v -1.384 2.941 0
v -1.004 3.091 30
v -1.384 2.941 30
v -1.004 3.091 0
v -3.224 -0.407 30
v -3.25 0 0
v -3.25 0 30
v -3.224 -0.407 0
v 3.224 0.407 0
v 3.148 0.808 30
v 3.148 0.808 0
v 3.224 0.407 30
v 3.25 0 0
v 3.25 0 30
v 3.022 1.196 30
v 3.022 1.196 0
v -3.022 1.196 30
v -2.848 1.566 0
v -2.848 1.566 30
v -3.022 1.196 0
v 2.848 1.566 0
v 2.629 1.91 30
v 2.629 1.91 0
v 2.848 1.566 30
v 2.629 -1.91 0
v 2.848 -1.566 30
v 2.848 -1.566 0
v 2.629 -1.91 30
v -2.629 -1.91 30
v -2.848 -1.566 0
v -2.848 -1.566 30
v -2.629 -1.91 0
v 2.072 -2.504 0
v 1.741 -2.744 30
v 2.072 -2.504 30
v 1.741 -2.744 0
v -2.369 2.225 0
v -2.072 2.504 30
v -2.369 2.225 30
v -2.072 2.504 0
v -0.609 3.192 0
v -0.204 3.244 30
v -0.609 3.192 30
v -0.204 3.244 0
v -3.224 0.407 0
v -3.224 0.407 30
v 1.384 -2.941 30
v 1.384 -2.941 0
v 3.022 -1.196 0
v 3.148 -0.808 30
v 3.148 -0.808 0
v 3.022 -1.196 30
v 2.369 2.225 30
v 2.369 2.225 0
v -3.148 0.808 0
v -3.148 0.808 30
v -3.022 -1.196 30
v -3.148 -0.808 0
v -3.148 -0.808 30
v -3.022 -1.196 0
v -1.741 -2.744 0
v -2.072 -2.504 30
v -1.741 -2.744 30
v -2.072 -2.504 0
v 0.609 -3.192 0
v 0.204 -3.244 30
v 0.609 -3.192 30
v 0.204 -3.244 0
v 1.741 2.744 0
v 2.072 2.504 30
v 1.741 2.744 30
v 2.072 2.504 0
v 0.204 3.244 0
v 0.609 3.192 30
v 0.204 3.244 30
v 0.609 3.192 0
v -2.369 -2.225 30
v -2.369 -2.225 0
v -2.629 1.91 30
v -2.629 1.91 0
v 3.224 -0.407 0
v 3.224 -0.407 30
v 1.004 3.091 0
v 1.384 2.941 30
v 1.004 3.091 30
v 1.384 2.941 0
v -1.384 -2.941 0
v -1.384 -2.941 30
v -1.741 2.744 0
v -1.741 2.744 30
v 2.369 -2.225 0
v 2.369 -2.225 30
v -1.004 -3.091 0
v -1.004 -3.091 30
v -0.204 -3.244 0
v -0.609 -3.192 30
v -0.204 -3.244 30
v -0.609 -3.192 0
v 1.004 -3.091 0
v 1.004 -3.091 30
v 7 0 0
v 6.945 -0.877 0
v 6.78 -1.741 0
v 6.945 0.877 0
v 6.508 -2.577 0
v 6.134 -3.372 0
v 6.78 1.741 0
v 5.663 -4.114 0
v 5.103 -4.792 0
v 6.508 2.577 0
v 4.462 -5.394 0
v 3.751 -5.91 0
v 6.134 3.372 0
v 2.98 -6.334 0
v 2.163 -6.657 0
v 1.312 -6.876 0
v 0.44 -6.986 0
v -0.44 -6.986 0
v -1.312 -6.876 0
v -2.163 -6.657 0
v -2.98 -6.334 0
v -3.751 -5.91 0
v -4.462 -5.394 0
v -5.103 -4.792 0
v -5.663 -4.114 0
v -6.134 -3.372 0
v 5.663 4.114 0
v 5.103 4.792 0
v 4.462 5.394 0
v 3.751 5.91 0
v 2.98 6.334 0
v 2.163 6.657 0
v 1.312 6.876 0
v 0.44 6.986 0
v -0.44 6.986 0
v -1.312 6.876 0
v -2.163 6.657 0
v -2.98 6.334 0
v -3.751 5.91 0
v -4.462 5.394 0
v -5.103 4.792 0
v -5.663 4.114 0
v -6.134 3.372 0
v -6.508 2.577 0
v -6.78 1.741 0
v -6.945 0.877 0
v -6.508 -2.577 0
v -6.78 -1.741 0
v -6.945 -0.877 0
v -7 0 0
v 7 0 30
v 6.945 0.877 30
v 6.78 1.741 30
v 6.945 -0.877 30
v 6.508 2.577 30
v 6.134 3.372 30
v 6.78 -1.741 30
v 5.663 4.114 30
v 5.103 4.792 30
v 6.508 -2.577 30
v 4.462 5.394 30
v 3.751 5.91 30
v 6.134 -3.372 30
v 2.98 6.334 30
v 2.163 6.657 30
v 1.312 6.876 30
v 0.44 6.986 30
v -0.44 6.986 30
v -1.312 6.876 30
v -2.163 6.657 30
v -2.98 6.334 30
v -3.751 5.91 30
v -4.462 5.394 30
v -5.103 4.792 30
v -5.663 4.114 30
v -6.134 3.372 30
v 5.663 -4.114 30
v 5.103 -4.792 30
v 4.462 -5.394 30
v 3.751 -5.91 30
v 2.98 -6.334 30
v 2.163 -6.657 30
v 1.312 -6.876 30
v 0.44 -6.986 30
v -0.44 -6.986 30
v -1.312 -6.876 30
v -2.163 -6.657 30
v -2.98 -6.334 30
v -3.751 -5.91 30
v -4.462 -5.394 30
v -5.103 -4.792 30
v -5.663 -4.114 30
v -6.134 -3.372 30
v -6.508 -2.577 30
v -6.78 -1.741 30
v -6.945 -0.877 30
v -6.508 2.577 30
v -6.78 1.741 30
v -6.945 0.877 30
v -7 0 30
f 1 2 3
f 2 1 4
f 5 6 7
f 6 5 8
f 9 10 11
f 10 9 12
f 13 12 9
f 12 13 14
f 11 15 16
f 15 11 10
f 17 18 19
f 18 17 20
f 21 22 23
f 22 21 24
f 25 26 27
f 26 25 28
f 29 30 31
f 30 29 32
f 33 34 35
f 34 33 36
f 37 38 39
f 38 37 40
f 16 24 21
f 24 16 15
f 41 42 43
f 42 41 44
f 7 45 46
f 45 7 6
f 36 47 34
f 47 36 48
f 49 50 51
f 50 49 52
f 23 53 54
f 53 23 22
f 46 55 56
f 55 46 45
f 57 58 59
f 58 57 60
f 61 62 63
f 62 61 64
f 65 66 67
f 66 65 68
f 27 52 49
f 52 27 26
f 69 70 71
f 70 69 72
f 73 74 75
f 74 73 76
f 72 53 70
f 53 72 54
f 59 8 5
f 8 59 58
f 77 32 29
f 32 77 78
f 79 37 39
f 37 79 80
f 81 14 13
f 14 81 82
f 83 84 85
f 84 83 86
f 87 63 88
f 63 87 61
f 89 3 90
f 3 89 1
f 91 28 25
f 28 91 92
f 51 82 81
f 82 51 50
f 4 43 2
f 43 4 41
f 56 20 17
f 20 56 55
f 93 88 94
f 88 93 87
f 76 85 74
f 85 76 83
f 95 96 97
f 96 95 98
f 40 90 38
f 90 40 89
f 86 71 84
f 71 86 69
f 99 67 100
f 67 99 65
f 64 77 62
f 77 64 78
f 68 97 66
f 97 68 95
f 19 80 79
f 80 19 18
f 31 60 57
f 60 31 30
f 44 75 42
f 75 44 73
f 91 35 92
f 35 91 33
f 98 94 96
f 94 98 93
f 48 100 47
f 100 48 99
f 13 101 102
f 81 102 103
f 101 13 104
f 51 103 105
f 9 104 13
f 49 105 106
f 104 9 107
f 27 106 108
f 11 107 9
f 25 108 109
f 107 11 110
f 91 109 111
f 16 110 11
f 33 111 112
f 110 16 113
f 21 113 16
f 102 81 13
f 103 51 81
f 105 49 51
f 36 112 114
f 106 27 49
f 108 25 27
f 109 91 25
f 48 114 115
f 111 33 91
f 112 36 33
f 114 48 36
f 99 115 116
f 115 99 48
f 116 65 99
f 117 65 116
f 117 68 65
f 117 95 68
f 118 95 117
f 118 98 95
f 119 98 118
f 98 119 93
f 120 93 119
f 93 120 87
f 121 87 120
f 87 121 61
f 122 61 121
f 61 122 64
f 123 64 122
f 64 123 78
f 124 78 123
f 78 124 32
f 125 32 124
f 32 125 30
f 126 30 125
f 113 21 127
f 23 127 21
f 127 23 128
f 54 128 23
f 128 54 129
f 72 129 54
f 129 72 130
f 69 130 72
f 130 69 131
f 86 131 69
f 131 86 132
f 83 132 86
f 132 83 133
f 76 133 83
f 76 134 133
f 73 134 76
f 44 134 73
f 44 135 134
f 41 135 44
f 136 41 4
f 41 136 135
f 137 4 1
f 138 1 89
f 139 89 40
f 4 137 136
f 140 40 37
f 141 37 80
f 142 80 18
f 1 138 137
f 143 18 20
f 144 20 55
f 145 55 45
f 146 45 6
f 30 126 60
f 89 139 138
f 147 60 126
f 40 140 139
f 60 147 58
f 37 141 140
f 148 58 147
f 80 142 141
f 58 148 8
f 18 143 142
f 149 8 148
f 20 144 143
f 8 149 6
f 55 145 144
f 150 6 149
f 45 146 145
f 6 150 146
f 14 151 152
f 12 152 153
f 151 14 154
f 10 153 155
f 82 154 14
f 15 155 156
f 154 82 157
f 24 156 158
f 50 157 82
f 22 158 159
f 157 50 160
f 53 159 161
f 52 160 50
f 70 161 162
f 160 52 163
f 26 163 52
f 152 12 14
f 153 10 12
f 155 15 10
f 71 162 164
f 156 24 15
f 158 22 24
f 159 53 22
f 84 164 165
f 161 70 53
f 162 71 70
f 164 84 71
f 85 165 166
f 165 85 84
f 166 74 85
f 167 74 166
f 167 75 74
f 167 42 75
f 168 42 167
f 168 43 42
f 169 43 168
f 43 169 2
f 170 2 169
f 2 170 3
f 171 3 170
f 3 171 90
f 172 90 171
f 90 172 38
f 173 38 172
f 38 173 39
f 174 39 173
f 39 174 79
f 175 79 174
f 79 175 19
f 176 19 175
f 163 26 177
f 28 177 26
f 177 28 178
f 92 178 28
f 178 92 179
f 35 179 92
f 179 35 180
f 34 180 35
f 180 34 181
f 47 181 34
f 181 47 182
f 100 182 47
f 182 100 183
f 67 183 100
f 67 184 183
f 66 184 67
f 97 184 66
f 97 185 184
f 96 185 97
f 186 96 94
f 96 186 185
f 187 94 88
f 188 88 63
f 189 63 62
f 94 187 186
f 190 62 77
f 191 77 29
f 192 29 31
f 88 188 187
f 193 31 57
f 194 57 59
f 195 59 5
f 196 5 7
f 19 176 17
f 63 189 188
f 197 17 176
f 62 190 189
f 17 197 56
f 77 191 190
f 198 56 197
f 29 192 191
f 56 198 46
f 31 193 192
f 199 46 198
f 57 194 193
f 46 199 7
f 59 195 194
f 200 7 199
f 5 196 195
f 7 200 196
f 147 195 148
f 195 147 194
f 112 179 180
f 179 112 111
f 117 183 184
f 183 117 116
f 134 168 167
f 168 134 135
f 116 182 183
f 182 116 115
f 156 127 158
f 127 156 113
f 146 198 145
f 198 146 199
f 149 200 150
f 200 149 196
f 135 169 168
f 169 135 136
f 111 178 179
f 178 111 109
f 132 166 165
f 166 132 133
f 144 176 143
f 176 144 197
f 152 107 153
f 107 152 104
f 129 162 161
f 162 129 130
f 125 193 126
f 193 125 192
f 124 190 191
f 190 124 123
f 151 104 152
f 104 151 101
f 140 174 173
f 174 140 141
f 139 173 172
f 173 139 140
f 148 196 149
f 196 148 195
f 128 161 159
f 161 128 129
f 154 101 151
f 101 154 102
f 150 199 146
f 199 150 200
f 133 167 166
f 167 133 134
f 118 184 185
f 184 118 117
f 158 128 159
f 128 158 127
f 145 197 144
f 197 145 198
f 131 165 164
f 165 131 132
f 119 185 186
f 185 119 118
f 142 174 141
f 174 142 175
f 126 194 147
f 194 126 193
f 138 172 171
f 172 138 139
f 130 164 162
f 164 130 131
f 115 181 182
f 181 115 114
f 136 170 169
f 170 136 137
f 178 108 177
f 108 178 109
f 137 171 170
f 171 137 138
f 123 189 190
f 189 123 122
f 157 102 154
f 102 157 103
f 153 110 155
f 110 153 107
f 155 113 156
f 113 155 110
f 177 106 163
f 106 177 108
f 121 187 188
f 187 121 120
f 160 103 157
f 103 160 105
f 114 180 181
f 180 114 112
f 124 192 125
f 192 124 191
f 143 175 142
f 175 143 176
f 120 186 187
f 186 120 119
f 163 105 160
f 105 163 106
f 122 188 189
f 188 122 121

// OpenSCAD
$fn = 50;

difference() {
	union() {
		cylinder(h = 30, r = 7.0);
	}
	union() {
		cylinder(h = 30, r = 3.25);
		cylinder(h = 30, r = 1.8);
	}
}
